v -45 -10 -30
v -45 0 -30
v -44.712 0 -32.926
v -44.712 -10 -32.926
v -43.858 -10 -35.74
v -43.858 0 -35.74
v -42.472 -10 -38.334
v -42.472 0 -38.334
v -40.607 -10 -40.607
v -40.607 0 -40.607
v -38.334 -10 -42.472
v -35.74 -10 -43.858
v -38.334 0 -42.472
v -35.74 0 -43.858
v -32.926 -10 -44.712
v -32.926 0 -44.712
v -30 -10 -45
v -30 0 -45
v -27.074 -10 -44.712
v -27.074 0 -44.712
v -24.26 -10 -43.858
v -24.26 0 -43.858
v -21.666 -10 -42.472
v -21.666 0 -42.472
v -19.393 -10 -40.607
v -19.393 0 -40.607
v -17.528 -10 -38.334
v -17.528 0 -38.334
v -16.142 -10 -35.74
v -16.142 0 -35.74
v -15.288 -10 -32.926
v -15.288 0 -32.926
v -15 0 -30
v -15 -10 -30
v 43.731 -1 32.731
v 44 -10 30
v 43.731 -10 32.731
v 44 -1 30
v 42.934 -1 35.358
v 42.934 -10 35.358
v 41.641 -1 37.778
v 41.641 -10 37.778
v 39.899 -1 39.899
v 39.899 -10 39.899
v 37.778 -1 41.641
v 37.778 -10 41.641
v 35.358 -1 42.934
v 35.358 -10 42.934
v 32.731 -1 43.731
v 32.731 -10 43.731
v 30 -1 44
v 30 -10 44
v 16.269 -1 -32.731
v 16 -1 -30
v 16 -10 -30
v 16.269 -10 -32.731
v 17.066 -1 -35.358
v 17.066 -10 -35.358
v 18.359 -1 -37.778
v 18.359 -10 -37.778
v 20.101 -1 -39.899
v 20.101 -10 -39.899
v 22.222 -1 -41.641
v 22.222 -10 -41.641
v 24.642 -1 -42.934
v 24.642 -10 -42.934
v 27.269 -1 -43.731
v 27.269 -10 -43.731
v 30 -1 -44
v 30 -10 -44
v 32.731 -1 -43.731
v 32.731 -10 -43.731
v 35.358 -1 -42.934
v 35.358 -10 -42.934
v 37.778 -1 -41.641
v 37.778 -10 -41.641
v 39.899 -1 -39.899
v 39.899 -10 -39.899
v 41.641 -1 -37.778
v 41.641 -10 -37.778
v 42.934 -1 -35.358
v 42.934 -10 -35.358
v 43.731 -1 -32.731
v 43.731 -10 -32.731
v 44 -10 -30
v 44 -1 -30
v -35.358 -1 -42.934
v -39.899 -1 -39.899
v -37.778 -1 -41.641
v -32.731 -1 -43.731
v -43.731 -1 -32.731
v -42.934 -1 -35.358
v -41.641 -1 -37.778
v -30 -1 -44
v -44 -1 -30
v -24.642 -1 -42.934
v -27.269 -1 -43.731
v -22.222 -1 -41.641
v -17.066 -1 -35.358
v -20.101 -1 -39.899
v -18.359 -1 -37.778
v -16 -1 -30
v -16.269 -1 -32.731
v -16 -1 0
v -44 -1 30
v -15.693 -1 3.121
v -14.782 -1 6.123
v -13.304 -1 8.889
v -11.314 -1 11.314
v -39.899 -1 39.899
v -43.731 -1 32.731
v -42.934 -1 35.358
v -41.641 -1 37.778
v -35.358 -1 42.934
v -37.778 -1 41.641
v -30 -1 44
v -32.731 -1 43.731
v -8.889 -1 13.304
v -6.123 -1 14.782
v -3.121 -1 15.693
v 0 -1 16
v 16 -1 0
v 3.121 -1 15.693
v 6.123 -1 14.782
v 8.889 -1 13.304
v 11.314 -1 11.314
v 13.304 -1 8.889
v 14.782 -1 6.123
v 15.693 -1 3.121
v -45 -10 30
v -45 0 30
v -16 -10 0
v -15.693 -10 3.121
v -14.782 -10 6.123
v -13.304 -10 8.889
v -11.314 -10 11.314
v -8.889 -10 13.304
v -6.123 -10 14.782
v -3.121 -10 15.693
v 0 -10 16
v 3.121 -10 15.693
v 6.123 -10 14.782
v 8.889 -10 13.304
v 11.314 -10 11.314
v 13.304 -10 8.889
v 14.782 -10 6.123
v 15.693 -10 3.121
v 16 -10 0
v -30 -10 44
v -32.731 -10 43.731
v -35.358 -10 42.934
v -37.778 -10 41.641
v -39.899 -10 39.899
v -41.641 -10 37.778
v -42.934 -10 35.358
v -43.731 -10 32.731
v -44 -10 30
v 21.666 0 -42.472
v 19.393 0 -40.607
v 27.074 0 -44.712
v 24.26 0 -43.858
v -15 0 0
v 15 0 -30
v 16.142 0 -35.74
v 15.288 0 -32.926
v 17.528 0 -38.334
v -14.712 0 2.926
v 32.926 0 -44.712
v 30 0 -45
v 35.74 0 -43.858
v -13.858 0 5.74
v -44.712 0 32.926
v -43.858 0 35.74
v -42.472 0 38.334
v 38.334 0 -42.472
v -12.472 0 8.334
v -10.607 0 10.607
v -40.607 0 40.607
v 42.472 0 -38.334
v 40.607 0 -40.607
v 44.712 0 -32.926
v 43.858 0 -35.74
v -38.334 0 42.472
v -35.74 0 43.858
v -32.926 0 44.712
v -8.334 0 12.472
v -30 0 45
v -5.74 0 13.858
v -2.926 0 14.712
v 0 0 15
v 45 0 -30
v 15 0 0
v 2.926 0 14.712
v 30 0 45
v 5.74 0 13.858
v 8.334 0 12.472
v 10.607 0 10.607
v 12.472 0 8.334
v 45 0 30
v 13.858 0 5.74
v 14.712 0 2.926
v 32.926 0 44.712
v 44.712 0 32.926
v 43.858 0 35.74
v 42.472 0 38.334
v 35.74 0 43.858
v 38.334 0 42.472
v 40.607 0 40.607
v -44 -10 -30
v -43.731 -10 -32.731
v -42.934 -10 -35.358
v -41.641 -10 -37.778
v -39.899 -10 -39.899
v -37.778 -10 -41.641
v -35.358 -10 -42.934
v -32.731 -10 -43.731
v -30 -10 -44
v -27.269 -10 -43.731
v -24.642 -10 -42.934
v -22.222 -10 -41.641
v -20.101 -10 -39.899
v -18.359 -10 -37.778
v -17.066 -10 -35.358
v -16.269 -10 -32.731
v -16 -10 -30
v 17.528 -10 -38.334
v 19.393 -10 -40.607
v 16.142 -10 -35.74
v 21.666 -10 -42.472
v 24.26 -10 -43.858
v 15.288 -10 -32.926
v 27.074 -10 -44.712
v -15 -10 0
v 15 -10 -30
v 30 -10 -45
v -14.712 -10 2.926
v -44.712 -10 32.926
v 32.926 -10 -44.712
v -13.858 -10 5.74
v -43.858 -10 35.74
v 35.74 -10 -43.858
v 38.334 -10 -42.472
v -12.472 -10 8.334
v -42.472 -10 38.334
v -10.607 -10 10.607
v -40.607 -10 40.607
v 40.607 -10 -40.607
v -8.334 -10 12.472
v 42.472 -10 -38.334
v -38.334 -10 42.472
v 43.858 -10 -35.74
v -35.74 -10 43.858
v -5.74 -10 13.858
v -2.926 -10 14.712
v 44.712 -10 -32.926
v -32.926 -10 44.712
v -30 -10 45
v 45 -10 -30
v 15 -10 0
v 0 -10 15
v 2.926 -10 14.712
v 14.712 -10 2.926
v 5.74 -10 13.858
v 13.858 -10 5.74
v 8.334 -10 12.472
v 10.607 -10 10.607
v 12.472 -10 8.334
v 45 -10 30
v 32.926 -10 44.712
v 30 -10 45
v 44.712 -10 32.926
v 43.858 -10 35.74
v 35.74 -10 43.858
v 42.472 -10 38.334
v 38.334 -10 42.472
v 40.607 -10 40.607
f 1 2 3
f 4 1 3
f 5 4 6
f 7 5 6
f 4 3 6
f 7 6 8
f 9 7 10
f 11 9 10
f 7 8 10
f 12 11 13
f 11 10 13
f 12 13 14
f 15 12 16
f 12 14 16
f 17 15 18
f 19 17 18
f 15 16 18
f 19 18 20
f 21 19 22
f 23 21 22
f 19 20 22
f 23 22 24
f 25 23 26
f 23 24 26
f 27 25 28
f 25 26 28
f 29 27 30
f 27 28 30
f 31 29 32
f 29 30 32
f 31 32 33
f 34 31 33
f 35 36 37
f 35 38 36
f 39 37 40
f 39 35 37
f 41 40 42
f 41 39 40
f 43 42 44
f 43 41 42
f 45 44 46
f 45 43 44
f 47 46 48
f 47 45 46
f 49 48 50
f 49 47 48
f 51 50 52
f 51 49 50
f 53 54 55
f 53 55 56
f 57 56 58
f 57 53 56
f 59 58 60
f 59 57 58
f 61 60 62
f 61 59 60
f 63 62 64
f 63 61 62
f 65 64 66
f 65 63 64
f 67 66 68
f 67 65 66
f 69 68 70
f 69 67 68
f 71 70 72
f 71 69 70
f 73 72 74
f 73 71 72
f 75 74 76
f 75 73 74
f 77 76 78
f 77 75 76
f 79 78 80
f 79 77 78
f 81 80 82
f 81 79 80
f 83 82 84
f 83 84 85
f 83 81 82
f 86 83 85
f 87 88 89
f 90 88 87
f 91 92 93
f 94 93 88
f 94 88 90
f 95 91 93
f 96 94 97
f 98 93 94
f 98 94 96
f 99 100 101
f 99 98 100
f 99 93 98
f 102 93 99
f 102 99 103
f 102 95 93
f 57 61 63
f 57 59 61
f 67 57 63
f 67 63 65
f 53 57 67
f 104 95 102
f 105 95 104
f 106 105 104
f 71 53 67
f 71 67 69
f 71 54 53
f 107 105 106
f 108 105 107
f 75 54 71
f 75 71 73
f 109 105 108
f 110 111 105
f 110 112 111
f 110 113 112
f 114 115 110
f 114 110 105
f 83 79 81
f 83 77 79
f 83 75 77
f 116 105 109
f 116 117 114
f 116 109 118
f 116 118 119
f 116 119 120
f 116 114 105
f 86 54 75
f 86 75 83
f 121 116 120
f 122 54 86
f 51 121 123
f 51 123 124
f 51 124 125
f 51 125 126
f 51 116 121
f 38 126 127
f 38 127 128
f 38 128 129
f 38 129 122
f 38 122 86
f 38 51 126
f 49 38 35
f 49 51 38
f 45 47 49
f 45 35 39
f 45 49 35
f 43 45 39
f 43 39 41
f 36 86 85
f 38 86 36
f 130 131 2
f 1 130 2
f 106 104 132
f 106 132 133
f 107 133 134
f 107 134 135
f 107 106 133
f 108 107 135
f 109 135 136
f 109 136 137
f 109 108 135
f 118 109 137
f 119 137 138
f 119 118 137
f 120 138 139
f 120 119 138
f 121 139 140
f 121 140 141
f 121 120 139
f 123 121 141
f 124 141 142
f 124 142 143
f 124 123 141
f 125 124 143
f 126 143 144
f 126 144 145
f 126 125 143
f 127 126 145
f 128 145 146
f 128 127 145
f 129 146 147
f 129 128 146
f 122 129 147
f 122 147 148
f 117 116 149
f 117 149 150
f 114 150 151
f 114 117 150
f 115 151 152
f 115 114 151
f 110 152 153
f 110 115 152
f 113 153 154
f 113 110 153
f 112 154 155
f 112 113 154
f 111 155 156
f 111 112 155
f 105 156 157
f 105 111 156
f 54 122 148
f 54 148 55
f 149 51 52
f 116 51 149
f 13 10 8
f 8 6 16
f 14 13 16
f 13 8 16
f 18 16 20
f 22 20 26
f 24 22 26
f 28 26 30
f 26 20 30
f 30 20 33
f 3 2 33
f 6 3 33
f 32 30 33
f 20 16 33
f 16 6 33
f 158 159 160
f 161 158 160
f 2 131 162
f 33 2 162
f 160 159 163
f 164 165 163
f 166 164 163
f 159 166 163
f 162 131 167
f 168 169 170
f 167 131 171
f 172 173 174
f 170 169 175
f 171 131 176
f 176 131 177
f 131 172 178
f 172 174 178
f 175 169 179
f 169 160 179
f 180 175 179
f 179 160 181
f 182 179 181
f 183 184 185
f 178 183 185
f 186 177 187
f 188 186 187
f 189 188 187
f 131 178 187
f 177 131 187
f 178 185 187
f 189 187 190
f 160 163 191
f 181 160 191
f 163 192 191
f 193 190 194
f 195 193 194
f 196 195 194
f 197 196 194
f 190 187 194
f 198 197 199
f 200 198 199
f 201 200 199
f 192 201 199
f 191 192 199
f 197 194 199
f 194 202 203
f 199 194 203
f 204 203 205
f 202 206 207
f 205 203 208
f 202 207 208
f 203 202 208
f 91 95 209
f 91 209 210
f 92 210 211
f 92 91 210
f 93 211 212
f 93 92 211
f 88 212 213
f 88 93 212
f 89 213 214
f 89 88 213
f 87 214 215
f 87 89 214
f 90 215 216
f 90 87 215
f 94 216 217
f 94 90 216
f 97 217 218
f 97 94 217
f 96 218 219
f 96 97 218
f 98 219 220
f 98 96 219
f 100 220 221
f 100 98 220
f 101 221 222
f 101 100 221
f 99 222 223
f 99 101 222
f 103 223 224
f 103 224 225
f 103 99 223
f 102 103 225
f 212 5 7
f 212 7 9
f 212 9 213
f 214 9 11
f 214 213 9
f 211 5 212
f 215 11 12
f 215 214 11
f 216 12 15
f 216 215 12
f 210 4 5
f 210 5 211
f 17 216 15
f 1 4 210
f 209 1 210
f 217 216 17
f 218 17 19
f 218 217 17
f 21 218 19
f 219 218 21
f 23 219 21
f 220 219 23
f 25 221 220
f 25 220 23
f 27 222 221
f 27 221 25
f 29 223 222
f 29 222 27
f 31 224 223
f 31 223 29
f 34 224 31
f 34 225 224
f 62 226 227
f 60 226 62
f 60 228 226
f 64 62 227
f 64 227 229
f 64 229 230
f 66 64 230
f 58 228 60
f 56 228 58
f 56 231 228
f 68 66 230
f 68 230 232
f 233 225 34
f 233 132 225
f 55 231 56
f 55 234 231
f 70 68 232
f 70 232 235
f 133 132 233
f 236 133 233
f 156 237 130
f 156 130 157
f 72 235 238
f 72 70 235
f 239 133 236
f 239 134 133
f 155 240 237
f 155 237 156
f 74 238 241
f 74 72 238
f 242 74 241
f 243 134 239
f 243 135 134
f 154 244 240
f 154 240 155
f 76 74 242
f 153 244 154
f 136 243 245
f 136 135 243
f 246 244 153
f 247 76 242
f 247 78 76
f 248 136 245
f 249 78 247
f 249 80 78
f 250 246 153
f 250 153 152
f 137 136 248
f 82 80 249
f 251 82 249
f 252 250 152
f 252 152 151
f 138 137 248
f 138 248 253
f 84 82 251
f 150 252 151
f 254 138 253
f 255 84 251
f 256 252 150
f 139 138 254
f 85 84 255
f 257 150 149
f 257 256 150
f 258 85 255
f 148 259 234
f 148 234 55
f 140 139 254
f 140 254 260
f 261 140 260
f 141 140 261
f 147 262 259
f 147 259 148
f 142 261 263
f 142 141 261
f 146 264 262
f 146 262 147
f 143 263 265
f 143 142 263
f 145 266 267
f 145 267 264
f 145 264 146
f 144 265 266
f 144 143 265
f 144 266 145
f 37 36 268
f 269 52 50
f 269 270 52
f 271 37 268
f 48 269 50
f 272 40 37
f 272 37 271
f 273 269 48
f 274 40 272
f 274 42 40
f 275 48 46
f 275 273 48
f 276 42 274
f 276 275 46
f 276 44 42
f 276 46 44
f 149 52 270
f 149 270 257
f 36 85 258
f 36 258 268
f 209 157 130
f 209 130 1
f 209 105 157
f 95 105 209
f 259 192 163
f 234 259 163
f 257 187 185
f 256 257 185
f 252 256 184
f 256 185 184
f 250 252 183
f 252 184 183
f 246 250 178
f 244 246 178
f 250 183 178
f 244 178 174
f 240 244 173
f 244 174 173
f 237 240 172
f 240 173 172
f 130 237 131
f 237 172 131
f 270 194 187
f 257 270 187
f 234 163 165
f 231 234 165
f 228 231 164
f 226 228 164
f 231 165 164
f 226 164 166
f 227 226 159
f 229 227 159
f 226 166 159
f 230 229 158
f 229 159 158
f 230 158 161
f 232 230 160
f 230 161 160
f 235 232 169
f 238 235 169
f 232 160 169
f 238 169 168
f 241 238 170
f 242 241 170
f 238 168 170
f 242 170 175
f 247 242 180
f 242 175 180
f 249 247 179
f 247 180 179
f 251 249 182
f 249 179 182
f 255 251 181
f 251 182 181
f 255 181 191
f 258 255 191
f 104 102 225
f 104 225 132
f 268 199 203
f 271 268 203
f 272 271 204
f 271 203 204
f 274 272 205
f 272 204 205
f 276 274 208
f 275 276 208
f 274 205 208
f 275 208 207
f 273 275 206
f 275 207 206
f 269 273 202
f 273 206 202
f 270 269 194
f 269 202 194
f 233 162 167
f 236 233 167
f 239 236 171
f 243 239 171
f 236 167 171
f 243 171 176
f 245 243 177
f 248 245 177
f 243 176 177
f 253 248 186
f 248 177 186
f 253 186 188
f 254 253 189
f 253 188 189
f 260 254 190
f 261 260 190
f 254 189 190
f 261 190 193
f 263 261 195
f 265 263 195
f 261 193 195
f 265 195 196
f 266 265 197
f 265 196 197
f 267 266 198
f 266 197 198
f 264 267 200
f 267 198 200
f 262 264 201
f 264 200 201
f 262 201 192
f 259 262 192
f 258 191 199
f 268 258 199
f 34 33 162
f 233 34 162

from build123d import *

# Parameters (mm, degrees)
F1_DEPTH = 10
F2_T     = -1


with BuildPart() as f1:
    # F0 (on Front) → F1 (new body)
    with BuildSketch(Plane.XZ):
        with BuildLine():
            Line((30, 45), (-30, 45))
            ThreePointArc((-30, 45), (-40.606602, 40.606602), (-45, 30))
            Line((-45, 30), (-45, -30))
            ThreePointArc((-45, -30), (-30, -45), (-15, -30))
            Line((-15, -30), (-15, 0))
            ThreePointArc((-15, 0), (0, 15), (15, 0))
            Line((15, 0), (15, -30))
            ThreePointArc((15, -30), (30, -45), (45, -30))
            Line((45, -30), (45, 30))
            ThreePointArc((45, 30), (40.606602, 40.606602), (30, 45))
        make_face()
    extrude(amount=F1_DEPTH)

    # F2
    f2_openings = [f1.faces().sort_by_distance(p)[0] for p in [
        (0, -10, 43.727208),
    ]]
    offset(amount=F2_T, openings=f2_openings)


solid = f1.part
